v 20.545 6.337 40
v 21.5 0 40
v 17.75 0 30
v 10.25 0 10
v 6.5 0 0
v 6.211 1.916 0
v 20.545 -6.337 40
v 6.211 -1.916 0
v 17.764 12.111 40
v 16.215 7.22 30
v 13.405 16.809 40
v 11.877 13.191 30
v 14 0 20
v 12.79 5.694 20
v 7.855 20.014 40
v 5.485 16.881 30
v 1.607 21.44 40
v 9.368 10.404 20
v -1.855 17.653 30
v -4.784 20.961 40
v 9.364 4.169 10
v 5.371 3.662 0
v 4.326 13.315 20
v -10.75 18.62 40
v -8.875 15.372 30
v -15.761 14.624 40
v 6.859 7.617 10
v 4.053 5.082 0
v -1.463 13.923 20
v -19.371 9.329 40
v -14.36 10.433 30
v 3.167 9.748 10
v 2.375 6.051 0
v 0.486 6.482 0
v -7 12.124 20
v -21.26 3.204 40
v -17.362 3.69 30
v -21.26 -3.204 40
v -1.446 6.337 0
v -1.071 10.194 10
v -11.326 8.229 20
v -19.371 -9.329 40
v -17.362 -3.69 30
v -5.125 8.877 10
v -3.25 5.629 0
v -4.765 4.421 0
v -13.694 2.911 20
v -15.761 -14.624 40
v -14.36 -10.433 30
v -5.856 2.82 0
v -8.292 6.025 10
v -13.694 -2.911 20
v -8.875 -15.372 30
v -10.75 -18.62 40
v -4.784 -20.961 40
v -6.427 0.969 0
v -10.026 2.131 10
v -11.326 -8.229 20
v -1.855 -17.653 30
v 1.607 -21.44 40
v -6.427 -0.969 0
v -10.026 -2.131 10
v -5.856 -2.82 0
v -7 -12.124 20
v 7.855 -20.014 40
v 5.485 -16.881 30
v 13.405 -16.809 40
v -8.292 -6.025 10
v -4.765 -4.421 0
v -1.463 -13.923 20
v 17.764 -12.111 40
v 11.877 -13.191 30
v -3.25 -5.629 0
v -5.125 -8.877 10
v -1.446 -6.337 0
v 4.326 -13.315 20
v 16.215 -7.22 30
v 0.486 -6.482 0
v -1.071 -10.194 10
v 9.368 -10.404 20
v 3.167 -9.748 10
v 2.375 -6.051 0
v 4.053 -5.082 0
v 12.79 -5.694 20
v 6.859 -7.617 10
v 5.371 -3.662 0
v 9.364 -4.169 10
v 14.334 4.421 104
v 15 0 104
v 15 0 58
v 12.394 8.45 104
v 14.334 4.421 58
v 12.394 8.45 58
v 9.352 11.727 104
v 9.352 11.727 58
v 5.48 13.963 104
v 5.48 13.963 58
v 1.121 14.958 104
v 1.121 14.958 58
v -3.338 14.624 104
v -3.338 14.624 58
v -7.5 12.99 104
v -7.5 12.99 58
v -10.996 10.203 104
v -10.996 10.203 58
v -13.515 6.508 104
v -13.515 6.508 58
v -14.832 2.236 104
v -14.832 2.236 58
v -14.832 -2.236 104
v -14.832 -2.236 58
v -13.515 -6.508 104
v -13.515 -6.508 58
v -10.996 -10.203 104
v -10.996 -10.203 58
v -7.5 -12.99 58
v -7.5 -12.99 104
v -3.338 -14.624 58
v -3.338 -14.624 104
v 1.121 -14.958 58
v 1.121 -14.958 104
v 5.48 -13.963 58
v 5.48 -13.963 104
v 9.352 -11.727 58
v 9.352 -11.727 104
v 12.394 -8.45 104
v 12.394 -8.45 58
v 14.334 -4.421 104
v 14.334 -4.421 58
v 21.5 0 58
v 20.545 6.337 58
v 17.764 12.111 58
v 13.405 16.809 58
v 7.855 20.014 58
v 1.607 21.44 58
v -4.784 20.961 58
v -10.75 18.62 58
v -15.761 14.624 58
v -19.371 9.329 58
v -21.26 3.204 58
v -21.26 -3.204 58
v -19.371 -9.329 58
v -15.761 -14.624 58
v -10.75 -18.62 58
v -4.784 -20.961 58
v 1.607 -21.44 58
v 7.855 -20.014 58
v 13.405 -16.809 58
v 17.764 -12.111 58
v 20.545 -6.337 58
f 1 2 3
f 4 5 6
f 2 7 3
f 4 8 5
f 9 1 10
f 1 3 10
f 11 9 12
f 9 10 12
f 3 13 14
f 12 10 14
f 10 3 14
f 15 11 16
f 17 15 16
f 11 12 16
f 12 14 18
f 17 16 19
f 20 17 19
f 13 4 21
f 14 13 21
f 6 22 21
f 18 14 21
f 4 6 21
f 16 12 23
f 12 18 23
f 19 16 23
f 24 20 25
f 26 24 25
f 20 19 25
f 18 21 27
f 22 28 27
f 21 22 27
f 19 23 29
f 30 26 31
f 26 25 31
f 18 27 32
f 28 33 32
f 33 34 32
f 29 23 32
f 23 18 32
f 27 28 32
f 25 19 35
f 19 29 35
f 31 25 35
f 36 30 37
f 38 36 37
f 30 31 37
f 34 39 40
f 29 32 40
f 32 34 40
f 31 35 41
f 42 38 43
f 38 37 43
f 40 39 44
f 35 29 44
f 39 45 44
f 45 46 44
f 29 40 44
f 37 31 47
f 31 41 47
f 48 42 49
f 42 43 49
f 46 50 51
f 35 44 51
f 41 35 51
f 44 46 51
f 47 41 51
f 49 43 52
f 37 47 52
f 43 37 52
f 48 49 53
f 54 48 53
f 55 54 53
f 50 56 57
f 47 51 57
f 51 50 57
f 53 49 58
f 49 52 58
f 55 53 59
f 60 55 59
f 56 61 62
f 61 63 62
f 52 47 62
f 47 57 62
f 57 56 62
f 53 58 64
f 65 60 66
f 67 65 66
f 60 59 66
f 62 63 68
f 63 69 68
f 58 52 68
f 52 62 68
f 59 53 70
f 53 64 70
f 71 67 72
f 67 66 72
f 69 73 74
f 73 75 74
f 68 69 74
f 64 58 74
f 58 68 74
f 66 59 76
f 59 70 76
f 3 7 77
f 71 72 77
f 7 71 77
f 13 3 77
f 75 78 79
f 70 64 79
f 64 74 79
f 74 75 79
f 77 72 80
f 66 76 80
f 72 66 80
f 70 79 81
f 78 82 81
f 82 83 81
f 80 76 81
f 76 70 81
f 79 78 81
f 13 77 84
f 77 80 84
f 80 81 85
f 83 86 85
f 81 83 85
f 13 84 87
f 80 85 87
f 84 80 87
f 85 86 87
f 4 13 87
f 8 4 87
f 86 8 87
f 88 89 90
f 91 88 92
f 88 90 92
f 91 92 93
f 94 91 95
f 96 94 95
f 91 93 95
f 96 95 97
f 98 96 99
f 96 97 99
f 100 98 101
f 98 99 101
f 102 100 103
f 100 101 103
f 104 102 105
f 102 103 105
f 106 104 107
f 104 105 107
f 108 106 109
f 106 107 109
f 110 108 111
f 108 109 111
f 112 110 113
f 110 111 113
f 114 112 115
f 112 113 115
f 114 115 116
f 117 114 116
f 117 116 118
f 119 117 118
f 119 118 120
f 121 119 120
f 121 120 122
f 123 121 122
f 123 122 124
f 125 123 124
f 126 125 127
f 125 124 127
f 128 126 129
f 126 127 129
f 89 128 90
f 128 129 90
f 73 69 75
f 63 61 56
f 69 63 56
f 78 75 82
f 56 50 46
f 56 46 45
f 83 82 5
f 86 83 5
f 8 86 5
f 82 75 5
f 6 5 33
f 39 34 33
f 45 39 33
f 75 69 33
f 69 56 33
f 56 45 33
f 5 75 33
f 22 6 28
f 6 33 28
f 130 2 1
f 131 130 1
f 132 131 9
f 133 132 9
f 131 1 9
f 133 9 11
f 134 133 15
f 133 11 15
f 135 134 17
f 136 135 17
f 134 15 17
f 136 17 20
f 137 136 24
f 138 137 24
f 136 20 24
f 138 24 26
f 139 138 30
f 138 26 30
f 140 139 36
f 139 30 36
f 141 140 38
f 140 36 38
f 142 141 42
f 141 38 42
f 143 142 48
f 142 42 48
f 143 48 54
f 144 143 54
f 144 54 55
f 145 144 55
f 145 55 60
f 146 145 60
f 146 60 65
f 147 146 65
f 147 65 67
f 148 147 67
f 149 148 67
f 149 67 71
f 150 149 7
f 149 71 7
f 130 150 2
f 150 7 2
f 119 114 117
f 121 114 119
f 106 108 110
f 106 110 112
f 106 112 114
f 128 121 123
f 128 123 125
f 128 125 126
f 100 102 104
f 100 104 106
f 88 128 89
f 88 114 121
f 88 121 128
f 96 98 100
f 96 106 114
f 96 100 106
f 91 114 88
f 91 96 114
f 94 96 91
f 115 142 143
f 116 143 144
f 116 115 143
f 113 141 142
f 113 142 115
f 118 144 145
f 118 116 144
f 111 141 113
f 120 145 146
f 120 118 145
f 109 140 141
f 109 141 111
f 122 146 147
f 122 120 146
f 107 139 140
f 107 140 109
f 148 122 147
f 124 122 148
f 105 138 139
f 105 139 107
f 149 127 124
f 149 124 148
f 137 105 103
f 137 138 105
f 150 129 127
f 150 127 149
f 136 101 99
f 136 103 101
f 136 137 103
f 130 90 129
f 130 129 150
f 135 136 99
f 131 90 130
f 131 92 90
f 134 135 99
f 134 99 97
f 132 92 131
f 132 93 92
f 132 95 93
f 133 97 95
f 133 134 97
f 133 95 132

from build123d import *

# Parameters (mm, degrees)
F0_R     = 21.5
F1_DEPTH = 58
F2_R     = 15
F3_DEPTH = 46
F4_SIZE2 = 15
F4_SIZE  = 40


with BuildPart() as f1:
    # F0 (on Top) → F1 (new body)
    with BuildSketch(Plane.XY):
        Circle(F0_R)
    extrude(amount=F1_DEPTH)

    # F2 (on face) → F3 (join)
    with BuildSketch(Plane.XY.offset(58)):
        Circle(F2_R)
    extrude(amount=F3_DEPTH)

    # F4
    f4_edges = [f1.edges().sort_by_distance(p)[0] for p in [
        (-21.5, 0, 0),
    ]]
    chamfer(f4_edges, length=F4_SIZE, length2=F4_SIZE2)


solid = f1.part
